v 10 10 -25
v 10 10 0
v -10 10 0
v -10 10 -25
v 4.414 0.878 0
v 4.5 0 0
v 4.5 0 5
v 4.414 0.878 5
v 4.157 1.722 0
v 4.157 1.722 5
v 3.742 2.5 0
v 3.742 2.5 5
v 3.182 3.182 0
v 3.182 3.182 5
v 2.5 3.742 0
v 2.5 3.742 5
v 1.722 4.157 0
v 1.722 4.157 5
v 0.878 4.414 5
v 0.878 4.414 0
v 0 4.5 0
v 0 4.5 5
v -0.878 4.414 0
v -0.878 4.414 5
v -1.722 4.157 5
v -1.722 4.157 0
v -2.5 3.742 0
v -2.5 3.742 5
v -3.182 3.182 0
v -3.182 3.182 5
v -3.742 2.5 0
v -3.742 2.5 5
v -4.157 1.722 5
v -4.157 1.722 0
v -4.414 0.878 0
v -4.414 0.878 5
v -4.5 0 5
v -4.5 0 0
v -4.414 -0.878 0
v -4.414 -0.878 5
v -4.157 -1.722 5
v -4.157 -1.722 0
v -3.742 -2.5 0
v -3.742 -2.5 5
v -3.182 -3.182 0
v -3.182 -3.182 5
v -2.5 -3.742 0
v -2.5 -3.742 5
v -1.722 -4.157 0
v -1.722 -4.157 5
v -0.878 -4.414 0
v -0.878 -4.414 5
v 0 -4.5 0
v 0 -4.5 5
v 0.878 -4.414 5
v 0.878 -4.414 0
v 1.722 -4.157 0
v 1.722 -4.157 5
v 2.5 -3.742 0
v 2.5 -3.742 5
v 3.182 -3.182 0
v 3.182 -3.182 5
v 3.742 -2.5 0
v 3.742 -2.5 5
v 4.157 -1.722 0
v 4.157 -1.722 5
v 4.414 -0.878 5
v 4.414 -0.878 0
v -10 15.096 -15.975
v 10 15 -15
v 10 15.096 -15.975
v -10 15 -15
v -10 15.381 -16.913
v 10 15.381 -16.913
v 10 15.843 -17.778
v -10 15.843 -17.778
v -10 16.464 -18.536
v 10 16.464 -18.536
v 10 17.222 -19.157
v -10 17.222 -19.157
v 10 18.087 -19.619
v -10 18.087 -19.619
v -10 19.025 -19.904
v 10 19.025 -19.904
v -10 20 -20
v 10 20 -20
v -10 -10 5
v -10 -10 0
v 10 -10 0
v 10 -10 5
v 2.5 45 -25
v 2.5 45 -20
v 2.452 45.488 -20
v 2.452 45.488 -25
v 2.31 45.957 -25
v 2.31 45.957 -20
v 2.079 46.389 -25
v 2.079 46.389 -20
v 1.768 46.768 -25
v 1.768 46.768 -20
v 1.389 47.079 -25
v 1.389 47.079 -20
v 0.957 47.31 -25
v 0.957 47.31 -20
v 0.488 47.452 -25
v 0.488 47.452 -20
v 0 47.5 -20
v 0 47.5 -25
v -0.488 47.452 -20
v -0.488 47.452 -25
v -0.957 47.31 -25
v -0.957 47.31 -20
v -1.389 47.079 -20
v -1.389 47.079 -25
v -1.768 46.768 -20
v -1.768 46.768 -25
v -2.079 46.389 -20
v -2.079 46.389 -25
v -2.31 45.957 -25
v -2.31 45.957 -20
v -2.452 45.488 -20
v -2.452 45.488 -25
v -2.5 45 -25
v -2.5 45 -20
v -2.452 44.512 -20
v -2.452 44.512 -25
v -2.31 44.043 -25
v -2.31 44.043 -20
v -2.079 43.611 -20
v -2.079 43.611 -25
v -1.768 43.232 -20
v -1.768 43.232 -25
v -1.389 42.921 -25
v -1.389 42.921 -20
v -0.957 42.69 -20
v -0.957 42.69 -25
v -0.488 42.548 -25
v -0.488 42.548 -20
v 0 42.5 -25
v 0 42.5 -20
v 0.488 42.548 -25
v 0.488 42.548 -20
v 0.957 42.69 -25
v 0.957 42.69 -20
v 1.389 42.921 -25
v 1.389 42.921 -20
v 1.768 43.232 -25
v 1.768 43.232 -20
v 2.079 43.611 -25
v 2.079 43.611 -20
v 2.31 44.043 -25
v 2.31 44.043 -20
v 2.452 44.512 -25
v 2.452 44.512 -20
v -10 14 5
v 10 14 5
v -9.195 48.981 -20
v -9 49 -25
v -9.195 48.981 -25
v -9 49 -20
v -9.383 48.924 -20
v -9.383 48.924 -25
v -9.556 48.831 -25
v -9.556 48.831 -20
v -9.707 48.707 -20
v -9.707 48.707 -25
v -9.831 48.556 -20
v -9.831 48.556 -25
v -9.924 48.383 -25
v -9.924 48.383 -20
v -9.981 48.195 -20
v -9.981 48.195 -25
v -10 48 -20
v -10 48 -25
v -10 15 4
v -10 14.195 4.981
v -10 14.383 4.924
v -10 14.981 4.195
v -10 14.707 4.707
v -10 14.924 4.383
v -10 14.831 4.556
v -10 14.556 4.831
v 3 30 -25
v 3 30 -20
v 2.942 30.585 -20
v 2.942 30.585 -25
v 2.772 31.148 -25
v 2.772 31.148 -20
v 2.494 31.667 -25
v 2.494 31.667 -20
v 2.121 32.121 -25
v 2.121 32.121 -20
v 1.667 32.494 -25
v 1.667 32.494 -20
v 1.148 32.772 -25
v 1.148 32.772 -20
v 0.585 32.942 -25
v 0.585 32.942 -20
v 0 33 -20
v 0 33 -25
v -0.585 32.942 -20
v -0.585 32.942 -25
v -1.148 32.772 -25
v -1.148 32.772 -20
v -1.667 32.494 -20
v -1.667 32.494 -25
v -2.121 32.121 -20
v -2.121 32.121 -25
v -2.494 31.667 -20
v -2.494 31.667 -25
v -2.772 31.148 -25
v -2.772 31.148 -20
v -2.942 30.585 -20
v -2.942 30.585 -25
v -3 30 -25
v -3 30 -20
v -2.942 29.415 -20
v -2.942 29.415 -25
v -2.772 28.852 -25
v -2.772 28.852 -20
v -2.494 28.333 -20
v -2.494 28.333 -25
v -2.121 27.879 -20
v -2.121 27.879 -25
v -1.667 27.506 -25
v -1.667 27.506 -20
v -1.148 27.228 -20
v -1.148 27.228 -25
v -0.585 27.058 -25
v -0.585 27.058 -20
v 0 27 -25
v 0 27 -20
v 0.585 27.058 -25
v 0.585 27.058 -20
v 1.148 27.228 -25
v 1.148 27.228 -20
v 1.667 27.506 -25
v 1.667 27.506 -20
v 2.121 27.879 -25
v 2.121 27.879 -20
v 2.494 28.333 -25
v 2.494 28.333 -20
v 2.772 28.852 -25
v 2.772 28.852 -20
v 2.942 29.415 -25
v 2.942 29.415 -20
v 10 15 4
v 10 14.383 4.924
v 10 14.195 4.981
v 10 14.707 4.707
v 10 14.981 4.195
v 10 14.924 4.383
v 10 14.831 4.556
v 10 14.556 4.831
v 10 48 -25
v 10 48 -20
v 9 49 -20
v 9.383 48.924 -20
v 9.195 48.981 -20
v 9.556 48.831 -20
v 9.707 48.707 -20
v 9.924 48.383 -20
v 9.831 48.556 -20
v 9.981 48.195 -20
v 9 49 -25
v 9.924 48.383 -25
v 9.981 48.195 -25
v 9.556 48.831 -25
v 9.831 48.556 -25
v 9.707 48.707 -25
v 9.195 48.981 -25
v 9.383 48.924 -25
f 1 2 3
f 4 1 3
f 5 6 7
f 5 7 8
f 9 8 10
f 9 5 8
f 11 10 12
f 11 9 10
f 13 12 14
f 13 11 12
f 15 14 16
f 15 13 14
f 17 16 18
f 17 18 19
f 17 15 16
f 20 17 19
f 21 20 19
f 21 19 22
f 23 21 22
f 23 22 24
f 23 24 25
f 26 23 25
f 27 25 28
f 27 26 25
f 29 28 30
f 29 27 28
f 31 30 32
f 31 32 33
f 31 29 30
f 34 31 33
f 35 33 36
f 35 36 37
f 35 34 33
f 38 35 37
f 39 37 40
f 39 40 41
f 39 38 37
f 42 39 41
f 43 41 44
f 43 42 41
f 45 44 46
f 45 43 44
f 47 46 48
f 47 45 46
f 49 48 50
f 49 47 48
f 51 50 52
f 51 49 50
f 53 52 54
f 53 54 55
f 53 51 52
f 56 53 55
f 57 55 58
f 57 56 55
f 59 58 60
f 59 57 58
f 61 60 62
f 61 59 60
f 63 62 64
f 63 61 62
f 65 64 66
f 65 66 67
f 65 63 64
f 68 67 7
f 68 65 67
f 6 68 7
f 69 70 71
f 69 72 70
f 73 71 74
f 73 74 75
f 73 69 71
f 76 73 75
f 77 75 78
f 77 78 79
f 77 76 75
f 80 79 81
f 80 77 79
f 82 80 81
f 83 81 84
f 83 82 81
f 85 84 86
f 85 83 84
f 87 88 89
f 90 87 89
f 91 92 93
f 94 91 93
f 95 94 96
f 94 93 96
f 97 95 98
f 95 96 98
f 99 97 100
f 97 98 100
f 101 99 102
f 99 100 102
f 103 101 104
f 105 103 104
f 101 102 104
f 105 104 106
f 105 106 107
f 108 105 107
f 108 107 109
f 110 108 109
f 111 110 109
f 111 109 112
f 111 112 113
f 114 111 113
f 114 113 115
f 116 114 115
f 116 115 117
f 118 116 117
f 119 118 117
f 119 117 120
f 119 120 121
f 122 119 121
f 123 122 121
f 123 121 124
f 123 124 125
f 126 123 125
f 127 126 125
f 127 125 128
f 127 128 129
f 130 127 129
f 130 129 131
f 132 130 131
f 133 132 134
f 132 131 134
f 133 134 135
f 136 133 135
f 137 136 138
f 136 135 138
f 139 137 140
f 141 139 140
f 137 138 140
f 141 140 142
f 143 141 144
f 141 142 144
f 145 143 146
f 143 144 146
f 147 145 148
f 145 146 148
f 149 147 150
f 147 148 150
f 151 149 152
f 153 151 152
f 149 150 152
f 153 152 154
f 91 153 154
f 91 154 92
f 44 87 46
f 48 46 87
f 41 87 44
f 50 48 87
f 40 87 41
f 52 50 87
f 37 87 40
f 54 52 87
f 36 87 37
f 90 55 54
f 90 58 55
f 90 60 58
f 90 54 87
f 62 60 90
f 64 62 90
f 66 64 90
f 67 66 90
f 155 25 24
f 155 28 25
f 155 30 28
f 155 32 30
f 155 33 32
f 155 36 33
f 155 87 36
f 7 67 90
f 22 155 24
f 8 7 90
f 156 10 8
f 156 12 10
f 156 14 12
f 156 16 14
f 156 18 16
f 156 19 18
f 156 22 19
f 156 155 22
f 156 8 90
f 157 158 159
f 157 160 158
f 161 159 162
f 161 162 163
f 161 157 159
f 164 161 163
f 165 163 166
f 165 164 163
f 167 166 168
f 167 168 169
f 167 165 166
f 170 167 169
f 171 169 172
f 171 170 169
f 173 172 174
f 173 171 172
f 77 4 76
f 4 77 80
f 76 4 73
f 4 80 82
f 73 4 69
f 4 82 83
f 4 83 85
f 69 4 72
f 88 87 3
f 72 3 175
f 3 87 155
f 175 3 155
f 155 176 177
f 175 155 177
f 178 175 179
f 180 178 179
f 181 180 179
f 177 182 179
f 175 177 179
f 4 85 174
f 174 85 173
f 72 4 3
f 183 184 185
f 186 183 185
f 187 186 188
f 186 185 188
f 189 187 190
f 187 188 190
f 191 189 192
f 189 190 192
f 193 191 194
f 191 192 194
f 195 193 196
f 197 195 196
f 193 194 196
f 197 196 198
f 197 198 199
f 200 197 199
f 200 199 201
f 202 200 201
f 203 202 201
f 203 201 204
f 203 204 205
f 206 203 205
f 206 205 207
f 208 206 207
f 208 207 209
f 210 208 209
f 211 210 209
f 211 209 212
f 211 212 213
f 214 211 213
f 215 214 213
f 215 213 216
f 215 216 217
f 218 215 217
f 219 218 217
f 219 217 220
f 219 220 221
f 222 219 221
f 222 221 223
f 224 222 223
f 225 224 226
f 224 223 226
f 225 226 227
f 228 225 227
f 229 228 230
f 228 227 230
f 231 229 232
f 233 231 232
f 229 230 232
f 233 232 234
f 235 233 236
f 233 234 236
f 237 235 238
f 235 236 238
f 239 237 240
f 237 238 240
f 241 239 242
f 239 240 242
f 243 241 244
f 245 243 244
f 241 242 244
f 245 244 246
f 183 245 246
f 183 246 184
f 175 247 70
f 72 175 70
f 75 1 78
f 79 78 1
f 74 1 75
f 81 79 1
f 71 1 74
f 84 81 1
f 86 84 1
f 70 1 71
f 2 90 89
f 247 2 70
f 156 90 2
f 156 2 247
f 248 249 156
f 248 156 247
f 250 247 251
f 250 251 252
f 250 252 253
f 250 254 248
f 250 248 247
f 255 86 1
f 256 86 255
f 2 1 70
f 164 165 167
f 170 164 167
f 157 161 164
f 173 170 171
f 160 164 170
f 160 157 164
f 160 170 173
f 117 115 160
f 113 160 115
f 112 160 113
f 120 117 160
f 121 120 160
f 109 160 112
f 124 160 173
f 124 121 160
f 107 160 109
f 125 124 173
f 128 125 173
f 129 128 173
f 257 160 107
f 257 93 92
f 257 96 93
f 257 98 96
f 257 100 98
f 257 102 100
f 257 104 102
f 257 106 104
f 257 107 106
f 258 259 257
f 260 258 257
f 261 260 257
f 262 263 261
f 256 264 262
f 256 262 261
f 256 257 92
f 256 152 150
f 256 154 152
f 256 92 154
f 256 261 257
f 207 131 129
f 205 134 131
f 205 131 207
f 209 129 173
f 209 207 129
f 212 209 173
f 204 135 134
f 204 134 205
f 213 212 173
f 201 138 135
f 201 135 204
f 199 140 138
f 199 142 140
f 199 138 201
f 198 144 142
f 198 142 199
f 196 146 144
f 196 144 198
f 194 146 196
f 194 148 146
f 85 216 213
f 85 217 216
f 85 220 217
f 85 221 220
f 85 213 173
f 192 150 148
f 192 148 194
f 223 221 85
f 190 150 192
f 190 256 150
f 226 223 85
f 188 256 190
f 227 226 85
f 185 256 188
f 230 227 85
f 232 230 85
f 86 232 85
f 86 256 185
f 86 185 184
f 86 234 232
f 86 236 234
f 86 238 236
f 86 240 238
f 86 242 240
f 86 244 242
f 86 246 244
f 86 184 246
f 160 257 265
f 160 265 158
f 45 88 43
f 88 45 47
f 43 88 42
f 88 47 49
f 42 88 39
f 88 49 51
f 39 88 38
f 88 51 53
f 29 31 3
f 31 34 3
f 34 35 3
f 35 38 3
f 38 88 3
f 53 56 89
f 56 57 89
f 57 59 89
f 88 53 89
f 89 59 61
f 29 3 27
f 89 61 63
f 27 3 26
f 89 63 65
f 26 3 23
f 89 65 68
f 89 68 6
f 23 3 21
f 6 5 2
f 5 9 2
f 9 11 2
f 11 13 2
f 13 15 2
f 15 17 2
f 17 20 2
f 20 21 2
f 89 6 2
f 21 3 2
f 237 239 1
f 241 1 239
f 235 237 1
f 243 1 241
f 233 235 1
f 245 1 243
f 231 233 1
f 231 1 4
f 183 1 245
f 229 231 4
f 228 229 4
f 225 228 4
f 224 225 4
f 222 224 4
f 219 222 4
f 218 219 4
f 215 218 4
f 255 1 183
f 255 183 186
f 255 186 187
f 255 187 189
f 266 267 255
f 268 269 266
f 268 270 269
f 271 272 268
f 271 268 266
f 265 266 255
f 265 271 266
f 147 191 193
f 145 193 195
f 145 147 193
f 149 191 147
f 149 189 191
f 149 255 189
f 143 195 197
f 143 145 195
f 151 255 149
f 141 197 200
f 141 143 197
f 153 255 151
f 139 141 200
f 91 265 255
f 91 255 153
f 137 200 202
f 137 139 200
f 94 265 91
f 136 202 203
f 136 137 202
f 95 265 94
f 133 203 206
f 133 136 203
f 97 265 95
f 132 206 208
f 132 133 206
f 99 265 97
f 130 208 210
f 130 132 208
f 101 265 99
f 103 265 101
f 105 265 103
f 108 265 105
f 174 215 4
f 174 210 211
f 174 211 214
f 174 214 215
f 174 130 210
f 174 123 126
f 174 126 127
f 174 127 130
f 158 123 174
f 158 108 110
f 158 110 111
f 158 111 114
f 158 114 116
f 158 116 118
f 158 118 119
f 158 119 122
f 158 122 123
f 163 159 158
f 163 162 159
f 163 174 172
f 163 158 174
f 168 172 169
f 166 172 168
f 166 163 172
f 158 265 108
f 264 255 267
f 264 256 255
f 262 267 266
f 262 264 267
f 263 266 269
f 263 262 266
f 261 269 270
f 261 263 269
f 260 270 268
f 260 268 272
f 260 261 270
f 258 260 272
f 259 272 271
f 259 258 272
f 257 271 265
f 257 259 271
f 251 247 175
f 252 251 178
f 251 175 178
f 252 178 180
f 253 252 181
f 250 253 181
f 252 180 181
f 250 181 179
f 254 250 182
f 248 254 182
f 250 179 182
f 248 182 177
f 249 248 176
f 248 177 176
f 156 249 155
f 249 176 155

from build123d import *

# Parameters (mm, degrees)
SKETCH1_R           = 4.5
BOSS_EXTRUDE1_DEPTH = 5
SKETCH2_W           = 20
SKETCH2_H           = 39
BOSS_EXTRUDE2_DEPTH = 25
CUT_EXTRUDE1_DEPTH  = 30
SKETCH4_R           = 2.5
SKETCH4_R_2         = 3
CUT_EXTRUDE2_DEPTH  = 30
FILLET1_R           = 5
FILLET2_R           = 1


with BuildPart() as part:
    # Sketch1 → Boss-Extrude1 (new body)
    with BuildSketch(Plane.XY):
        Polygon((-10, 10), (-10, -10), (10, -10), (10, 10), (10, 49), (-10, 49), align=None)
        Circle(SKETCH1_R, mode=Mode.SUBTRACT)
    extrude(amount=BOSS_EXTRUDE1_DEPTH)

    # Sketch2 → Boss-Extrude2 (add)
    with BuildSketch(Plane(origin=(0, 0, 0), x_dir=(-1, 0, 0), z_dir=(0, 0, -1))):
        with Locations((0, 29.5)):
            Rectangle(SKETCH2_W, SKETCH2_H)
    extrude(amount=BOSS_EXTRUDE2_DEPTH)

    # Sketch3 → Cut-Extrude1 (cut)
    with BuildSketch(Plane(origin=(10, 0, 0), x_dir=(0, 0, -1), z_dir=(1, 0, 0))):
        Polygon((0, 15), (-5, 15), (-5, 49), (20, 49), (20, 15), align=None)
    extrude(amount=-CUT_EXTRUDE1_DEPTH, mode=Mode.SUBTRACT)

    # Sketch4 → Cut-Extrude2 (cut)
    with BuildSketch(Plane.XY.offset(-20)):
        with Locations((0, 45)):
            Circle(SKETCH4_R)
        with Locations((0, 30)):
            Circle(SKETCH4_R_2)
    extrude(amount=-CUT_EXTRUDE2_DEPTH, mode=Mode.SUBTRACT)

    # Fillet1
    fillet1_edges = [part.edges().sort_by_distance(p)[0] for p in [
        (0, 15, -20),
    ]]
    fillet(fillet1_edges, radius=FILLET1_R)

    # Fillet2
    fillet2_edges = [part.edges().sort_by_distance(p)[0] for p in [
        (-10, 49, -22.5),
        (10, 49, -22.5),
        (0, 15, 5),
    ]]
    fillet(fillet2_edges, radius=FILLET2_R)


solid = part.part
